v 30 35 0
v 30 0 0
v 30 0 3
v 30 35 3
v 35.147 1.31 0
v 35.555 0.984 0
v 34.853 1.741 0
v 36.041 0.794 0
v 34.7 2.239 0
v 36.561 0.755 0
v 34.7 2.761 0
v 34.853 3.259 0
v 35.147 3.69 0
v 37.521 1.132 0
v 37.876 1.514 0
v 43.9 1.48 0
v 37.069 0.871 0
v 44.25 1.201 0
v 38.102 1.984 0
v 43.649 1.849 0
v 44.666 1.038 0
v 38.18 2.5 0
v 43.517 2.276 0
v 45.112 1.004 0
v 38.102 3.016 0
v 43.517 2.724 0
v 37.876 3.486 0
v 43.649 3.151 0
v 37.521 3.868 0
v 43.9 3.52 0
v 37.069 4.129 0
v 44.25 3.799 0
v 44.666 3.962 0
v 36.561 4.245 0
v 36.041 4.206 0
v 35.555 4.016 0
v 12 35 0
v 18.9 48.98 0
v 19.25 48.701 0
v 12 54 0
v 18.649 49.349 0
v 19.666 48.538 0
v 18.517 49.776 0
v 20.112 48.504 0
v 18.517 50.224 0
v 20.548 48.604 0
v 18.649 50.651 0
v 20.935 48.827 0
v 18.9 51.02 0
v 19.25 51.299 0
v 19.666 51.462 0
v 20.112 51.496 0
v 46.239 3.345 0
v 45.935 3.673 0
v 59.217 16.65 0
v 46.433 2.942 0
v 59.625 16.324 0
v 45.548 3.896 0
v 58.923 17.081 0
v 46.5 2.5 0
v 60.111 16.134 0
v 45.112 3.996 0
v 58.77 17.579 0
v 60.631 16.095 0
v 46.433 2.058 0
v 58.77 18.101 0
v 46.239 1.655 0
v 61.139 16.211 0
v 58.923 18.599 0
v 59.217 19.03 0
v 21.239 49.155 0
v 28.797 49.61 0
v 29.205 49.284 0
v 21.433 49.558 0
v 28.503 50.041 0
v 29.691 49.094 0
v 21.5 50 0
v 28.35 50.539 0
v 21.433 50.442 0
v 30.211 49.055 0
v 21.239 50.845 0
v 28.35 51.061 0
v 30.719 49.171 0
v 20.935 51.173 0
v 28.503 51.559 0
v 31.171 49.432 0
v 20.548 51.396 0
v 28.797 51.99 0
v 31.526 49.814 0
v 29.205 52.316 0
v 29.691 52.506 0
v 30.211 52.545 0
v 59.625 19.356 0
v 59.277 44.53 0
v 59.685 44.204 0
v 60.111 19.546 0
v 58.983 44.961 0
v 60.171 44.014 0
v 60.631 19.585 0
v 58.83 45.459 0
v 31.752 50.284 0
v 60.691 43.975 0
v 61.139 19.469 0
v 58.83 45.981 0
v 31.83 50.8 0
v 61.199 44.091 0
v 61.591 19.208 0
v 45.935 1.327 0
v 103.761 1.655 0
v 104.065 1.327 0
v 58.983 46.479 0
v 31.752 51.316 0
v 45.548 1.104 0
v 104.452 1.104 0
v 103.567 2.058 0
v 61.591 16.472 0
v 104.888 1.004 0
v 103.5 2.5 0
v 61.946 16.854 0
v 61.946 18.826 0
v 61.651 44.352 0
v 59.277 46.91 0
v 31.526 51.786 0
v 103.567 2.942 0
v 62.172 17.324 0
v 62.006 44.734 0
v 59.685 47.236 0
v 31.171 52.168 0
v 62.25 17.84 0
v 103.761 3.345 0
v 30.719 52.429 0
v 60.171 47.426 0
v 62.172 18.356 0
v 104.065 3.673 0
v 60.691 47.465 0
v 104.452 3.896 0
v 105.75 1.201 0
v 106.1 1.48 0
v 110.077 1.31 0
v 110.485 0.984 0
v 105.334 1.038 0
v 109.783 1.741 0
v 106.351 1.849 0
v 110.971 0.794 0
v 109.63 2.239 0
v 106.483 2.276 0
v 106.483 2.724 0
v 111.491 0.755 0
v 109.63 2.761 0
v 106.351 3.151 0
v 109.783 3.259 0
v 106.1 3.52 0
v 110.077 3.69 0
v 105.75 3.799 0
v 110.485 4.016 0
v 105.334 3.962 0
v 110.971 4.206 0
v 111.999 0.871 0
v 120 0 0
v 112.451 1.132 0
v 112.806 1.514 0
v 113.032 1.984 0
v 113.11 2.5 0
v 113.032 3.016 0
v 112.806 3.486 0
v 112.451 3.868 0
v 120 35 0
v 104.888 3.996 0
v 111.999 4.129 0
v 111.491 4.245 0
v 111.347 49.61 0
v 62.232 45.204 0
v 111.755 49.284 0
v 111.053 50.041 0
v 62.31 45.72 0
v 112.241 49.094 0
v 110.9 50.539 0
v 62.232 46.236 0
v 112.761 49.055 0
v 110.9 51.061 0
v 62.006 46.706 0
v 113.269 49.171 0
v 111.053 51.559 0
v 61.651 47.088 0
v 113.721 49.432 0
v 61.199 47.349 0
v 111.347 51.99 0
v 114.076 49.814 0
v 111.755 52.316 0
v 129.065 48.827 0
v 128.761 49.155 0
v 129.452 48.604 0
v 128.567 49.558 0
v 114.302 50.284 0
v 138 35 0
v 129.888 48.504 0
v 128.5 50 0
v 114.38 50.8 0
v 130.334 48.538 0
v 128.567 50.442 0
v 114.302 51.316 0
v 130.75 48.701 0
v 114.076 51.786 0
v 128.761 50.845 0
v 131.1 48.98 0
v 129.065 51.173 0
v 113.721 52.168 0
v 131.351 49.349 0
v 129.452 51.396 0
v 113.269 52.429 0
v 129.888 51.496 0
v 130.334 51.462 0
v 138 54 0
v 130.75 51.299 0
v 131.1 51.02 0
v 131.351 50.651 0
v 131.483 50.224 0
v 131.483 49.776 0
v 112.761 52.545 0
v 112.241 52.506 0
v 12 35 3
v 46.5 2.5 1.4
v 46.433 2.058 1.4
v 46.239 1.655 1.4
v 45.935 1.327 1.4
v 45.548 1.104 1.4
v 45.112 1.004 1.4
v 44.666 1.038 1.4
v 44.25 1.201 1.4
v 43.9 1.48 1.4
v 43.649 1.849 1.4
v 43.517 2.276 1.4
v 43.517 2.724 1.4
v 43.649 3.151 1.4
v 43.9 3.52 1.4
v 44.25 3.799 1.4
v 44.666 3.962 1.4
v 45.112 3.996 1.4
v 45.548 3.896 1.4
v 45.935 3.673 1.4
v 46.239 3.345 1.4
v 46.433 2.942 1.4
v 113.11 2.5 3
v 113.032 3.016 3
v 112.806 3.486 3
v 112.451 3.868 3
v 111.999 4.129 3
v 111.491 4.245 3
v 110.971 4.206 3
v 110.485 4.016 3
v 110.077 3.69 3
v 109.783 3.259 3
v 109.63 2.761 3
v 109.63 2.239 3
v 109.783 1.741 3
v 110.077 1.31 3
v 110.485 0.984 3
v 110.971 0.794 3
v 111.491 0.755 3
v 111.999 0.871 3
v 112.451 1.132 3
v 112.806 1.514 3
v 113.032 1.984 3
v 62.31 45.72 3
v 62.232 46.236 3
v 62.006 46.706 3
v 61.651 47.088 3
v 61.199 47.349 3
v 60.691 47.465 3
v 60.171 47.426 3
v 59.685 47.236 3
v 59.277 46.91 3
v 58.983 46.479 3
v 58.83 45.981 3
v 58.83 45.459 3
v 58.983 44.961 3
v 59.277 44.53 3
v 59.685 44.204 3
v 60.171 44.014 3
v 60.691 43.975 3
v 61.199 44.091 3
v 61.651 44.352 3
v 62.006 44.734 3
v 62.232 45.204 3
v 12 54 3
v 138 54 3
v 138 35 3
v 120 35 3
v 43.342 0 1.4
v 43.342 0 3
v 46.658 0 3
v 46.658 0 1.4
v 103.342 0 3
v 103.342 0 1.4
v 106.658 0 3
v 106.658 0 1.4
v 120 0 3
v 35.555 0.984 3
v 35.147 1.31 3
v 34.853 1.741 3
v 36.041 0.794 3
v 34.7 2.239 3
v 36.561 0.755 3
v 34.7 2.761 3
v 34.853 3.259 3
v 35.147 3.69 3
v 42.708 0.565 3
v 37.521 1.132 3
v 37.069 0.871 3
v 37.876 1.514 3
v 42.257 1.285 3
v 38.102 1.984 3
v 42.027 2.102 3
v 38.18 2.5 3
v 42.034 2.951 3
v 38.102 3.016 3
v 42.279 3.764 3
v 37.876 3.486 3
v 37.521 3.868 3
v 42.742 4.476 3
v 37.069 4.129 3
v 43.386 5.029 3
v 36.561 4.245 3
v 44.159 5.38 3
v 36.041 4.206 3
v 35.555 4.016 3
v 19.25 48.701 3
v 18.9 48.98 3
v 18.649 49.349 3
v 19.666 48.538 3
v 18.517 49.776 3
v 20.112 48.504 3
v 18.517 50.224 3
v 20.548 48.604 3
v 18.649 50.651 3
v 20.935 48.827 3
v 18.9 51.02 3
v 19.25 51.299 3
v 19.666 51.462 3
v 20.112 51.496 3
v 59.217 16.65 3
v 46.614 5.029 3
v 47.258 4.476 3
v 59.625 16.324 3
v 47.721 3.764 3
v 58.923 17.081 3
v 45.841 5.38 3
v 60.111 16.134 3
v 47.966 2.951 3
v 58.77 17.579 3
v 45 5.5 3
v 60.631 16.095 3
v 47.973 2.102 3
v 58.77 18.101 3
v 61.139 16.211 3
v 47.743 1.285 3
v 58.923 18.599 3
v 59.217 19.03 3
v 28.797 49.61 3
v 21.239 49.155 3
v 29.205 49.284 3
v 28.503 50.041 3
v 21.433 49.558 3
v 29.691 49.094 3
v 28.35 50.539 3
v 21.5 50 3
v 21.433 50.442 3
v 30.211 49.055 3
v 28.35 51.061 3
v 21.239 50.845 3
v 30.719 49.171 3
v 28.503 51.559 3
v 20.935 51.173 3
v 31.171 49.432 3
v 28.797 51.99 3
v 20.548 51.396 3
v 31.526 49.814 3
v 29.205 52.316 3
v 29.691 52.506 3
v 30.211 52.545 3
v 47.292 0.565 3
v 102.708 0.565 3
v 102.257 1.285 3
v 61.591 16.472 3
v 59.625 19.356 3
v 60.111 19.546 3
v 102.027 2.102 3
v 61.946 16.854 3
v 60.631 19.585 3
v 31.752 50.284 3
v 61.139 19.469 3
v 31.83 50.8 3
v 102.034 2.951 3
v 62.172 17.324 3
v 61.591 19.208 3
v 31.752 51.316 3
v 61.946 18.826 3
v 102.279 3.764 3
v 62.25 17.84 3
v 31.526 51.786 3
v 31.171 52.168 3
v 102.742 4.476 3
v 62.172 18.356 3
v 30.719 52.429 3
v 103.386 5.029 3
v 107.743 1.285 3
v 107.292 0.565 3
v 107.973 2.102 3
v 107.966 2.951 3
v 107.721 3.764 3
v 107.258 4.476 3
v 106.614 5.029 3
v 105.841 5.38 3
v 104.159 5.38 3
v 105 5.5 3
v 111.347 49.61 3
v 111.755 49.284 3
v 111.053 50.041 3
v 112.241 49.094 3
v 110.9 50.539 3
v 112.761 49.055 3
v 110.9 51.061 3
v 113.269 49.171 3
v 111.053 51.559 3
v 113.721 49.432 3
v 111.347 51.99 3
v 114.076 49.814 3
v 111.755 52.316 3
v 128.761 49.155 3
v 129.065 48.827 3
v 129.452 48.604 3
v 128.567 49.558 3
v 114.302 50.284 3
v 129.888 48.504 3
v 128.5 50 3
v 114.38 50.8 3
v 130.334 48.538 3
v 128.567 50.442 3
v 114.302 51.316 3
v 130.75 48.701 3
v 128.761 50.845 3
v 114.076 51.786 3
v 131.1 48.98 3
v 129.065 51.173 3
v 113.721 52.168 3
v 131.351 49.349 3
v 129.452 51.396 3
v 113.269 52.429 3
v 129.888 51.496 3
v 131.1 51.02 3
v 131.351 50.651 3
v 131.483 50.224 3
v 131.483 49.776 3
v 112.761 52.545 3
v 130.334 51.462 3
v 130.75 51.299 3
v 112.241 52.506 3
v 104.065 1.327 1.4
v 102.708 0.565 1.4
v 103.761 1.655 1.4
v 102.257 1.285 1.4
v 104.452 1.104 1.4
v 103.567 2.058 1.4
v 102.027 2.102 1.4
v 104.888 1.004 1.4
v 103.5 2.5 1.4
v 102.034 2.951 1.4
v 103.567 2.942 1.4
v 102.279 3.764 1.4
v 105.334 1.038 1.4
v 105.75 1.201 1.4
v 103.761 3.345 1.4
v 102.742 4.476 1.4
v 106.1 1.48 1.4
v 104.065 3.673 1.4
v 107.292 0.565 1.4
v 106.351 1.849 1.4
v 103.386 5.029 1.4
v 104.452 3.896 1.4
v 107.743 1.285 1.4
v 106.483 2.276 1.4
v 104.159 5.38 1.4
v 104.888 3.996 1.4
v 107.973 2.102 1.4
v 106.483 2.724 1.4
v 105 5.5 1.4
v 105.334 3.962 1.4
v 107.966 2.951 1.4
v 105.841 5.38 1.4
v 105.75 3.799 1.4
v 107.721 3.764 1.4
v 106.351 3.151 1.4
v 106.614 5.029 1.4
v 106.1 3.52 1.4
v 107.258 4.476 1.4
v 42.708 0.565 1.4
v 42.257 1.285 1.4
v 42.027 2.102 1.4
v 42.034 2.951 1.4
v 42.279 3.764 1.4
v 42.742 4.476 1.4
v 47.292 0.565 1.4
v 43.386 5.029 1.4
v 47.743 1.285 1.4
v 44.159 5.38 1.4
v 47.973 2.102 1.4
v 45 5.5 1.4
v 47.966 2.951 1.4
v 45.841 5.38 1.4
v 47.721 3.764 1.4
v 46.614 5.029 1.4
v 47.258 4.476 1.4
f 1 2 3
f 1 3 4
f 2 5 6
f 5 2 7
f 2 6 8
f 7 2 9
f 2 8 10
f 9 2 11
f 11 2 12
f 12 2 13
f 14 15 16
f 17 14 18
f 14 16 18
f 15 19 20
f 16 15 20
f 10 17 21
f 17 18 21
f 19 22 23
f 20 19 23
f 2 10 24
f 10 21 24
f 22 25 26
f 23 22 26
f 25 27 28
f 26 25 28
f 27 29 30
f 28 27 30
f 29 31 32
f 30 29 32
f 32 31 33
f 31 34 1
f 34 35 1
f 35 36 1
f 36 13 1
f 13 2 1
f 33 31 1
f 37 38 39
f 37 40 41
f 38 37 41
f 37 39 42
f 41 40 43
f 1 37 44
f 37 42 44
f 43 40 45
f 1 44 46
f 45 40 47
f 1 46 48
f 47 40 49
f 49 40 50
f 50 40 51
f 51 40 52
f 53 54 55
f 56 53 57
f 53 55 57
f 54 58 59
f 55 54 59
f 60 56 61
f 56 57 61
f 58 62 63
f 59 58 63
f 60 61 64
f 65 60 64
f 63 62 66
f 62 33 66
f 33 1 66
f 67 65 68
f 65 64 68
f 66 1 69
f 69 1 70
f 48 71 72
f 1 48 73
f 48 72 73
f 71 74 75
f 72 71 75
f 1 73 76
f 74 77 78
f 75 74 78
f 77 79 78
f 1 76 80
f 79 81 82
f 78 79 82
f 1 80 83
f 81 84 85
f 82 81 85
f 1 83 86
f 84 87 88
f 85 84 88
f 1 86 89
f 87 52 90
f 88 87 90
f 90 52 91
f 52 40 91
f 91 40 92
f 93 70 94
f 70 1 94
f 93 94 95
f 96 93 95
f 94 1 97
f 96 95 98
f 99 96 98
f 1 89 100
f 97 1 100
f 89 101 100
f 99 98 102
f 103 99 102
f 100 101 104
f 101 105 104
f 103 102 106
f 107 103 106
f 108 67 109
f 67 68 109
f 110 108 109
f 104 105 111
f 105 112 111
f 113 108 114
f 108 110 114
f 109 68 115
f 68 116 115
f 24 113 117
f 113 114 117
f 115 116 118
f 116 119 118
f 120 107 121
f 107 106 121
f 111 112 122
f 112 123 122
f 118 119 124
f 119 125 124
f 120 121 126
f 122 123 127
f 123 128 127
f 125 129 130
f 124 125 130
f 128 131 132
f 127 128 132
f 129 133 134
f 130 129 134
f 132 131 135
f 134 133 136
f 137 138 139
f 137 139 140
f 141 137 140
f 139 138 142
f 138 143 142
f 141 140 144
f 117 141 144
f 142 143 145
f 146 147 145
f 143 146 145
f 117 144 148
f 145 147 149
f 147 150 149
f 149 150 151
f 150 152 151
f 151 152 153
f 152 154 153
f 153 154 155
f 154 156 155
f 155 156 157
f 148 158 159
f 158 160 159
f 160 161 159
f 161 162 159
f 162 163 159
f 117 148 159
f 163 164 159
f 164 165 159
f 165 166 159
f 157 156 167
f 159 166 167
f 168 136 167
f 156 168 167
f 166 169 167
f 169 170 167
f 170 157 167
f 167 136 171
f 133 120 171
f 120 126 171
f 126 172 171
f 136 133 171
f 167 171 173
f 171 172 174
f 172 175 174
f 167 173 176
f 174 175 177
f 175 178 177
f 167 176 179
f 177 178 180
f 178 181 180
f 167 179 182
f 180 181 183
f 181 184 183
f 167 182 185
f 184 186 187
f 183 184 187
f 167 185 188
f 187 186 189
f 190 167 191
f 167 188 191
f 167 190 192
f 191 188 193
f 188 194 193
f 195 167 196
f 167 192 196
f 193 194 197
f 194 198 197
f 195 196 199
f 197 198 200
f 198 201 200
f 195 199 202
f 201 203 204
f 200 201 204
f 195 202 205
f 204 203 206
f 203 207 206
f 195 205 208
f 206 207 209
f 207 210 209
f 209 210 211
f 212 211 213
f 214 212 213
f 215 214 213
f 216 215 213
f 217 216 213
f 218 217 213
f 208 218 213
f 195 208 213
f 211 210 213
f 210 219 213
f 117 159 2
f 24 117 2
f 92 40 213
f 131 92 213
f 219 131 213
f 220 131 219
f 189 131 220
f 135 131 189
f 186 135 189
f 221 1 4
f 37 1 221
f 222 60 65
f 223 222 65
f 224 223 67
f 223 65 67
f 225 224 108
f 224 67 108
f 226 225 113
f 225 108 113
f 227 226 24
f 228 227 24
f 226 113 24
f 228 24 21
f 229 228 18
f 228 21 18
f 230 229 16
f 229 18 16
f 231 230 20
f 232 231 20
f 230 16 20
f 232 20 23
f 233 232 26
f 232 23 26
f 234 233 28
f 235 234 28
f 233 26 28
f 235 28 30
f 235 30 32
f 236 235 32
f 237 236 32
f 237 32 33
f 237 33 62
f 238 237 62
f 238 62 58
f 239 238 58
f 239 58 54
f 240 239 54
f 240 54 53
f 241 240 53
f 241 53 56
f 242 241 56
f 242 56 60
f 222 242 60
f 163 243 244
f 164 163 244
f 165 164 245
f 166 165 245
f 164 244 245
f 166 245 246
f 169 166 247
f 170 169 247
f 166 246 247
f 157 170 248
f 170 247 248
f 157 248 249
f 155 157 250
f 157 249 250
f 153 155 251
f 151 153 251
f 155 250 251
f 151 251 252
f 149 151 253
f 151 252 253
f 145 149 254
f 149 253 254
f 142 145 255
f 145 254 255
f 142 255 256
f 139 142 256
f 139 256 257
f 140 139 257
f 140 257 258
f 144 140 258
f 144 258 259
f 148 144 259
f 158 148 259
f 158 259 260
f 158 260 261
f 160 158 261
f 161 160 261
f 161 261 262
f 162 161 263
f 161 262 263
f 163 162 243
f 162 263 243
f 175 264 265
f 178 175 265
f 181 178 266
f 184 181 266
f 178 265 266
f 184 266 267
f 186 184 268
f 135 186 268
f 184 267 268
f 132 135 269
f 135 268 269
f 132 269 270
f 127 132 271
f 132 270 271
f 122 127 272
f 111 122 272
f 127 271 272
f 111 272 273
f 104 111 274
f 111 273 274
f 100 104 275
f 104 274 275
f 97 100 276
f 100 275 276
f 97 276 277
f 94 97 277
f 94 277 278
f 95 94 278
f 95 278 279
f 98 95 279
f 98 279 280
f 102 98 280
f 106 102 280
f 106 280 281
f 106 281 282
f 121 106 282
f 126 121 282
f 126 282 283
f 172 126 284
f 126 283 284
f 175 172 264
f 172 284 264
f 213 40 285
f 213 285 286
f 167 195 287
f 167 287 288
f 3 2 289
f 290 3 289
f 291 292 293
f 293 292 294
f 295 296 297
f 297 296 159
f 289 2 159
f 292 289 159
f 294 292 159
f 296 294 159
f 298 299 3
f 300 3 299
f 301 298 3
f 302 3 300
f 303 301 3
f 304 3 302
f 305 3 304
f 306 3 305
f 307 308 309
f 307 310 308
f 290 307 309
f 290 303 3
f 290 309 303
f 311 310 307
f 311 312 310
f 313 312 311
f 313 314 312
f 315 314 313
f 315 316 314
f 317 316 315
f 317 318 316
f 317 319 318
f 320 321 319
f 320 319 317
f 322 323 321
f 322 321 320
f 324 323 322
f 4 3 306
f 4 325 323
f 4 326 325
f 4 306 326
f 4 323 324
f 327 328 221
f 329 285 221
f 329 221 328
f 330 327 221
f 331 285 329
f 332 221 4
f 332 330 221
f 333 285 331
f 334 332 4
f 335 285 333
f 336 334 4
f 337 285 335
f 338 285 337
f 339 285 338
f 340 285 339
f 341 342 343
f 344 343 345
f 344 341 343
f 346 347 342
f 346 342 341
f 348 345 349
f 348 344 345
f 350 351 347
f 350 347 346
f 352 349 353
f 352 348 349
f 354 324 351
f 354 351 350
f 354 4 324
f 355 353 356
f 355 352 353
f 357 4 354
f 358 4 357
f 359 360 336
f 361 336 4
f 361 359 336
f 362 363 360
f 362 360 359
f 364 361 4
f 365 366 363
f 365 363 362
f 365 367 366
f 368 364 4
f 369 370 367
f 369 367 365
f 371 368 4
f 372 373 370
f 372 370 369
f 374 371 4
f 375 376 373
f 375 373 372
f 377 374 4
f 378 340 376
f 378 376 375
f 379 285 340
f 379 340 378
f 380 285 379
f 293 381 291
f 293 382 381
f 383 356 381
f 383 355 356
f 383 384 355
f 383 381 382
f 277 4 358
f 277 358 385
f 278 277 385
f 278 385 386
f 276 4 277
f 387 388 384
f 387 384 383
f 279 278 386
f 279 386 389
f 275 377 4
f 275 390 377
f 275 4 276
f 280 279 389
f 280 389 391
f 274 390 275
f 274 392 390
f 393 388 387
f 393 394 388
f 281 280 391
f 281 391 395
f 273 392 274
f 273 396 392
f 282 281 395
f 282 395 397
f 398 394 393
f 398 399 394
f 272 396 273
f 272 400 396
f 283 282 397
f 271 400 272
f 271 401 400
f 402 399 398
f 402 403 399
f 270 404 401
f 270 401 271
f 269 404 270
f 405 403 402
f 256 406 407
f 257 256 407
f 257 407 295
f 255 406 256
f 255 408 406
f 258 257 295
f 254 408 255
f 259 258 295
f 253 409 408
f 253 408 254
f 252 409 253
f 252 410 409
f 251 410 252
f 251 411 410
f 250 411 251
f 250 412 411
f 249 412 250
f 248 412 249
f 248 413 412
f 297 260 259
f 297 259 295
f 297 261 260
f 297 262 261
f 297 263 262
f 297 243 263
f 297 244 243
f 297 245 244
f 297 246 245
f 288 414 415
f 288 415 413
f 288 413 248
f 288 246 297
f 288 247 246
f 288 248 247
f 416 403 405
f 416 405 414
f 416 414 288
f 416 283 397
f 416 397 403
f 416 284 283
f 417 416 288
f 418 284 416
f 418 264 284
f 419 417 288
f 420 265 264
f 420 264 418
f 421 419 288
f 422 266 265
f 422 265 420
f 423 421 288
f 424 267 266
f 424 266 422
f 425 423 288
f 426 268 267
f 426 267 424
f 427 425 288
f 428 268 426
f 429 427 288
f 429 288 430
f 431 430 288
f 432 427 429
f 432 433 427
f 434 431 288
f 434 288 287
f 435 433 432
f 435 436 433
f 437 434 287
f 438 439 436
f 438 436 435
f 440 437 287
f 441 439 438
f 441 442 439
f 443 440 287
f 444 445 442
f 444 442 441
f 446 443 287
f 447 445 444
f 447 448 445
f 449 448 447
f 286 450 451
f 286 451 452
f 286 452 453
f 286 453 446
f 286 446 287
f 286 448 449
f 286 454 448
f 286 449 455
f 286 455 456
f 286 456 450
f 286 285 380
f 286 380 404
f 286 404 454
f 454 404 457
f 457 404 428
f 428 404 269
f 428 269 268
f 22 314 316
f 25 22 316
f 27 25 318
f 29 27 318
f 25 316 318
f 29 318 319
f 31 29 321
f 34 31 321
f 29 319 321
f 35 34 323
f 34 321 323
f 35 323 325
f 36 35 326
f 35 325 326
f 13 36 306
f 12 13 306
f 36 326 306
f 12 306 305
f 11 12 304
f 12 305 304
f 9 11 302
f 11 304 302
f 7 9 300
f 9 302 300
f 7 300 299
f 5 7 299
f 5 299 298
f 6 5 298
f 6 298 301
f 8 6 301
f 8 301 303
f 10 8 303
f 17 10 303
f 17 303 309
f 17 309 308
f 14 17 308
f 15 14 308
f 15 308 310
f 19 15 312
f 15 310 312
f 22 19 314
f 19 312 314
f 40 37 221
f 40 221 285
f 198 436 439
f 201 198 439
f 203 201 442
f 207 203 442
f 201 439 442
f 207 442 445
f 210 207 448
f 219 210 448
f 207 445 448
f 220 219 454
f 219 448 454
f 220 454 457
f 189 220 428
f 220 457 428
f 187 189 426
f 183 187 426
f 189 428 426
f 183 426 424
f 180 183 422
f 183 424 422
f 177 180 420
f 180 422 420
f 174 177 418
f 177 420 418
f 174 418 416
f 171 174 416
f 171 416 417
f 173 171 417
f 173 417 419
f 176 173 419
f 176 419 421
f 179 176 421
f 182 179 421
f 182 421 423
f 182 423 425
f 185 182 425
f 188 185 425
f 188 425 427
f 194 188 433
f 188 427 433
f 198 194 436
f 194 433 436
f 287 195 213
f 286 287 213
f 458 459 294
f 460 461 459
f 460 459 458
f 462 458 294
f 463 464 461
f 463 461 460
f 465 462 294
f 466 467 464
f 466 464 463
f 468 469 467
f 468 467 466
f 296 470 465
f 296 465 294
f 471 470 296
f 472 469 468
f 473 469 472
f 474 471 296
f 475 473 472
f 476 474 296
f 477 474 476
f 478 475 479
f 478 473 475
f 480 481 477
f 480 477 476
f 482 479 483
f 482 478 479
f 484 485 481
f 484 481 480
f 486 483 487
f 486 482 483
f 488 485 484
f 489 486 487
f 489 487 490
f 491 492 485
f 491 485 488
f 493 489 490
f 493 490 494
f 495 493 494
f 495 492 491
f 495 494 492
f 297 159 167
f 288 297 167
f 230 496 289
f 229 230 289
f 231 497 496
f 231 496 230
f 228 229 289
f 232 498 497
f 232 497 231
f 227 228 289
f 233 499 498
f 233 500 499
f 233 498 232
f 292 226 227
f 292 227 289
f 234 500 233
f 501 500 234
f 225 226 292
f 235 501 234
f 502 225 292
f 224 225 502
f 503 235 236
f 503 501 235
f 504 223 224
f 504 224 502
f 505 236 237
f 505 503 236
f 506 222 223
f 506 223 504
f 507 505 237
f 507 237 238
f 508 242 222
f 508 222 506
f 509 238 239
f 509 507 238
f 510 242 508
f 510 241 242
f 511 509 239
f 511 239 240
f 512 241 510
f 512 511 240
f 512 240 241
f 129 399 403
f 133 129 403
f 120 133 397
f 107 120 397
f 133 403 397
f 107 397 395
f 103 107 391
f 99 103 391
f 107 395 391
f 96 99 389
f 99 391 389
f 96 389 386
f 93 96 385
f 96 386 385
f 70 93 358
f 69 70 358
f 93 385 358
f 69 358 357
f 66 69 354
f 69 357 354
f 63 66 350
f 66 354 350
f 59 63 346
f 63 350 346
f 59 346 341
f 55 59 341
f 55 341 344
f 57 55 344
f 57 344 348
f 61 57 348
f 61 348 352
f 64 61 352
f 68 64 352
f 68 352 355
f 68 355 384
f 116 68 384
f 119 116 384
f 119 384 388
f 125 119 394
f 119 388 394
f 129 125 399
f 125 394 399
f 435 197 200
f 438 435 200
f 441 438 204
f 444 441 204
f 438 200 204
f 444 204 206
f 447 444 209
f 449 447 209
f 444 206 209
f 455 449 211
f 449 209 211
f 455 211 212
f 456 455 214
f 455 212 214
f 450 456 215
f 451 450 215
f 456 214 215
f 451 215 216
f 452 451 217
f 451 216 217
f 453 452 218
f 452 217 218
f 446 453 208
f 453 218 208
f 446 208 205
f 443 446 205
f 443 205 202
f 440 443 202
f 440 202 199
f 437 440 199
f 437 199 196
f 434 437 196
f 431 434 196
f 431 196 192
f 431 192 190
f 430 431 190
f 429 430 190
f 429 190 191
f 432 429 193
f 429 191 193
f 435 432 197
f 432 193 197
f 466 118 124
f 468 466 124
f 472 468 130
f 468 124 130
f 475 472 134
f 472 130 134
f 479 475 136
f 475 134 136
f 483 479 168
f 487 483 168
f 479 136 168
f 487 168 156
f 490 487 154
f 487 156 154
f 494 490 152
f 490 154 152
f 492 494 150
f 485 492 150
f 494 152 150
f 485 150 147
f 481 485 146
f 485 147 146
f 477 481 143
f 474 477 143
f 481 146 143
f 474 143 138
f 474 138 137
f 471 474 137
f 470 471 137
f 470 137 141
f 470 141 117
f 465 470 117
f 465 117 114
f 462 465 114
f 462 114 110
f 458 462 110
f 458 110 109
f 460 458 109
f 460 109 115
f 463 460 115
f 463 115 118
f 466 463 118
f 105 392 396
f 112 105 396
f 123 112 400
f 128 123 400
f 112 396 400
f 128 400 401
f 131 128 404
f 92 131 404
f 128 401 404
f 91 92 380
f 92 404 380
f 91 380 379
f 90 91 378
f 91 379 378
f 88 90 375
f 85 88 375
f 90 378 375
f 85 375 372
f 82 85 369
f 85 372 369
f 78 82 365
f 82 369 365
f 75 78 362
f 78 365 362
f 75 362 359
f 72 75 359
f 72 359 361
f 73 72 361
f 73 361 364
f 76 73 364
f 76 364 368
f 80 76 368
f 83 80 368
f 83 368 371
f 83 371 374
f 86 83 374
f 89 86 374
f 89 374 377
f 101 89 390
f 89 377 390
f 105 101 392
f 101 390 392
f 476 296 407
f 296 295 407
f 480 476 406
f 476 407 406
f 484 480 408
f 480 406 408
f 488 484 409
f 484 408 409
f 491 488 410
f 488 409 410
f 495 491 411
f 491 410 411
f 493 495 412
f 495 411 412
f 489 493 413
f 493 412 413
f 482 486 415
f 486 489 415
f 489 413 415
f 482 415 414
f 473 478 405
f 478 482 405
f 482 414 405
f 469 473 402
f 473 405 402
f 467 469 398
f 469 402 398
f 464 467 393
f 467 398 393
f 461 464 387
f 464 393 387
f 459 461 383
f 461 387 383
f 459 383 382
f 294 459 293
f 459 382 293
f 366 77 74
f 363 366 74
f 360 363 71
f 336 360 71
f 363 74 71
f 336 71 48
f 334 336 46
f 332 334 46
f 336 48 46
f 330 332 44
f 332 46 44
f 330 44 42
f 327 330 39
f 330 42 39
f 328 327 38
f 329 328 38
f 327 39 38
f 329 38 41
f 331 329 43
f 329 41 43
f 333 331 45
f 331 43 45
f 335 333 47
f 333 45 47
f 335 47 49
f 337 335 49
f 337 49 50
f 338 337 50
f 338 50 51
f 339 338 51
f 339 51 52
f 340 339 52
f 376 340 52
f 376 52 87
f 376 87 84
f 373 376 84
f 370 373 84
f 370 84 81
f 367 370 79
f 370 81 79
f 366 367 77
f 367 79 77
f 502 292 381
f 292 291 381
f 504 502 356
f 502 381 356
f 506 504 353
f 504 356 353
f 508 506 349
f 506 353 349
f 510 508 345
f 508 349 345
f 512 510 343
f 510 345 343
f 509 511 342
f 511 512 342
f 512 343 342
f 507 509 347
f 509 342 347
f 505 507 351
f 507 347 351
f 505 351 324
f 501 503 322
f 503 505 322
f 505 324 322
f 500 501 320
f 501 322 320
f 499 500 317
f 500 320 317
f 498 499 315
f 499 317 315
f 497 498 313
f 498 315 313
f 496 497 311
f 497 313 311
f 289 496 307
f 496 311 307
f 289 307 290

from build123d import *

# Parameters (mm, degrees)
SKETCH1_W           = 150
SKETCH1_H           = 54
BOSS_EXTRUDE1_DEPTH = 3
SKETCH2_W           = 30
SKETCH2_H           = 35
CUT_EXTRUDE1_DEPTH  = 160.452187191
SKETCH4_W           = 12
SKETCH4_H           = 19
CUT_EXTRUDE2_DEPTH  = 3
SKETCH5_R           = 1.5
CUT_EXTRUDE3_DEPTH  = 3
SKETCH7_R           = 3
CUT_EXTRUDE5_DEPTH  = 1.6
SKETCH8_R           = 1.75
CUT_EXTRUDE6_DEPTH  = 3


with BuildPart() as part:
    # Sketch1 → Boss-Extrude1 (new body)
    with BuildSketch(Plane.XY):
        with Locations((75, 27)):
            Rectangle(SKETCH1_W, SKETCH1_H)
    extrude(amount=BOSS_EXTRUDE1_DEPTH)

    # Sketch2 → Cut-Extrude1 (cut, through all)
    with BuildSketch(Plane(origin=(0, 0, 0), x_dir=(-1, 0, 0), z_dir=(0, 0, -1))):
        with Locations((-15, 17.5)):
            Rectangle(SKETCH2_W, SKETCH2_H)
        with Locations((-135, 17.5)):
            Rectangle(SKETCH2_W, SKETCH2_H)
    extrude(amount=-CUT_EXTRUDE1_DEPTH, mode=Mode.SUBTRACT)

    # Sketch4 → Cut-Extrude2 (cut)
    with BuildSketch(Plane(origin=(0, 0, 0), x_dir=(-1, 0, 0), z_dir=(0, 0, -1))):
        with Locations((-144, 44.5)):
            Rectangle(SKETCH4_W, SKETCH4_H)
        with Locations((-6, 44.5)):
            Rectangle(SKETCH4_W, SKETCH4_H)
    extrude(amount=-CUT_EXTRUDE2_DEPTH, mode=Mode.SUBTRACT)

    # Sketch5 → Cut-Extrude3 (cut)
    with BuildSketch(Plane(origin=(0, 0, 0), x_dir=(-1, 0, 0), z_dir=(0, 0, -1))):
        with Locations((-130, 50)):
            Circle(SKETCH5_R)
        with Locations((-105, 2.5)):
            Circle(SKETCH5_R)
        with Locations(Location((-45, 2.5, 0), (0, 0, 180))):
            Circle(SKETCH5_R)
        with Locations(Location((-20, 50, 0), (0, 0, 180))):
            Circle(SKETCH5_R)
    extrude(amount=-CUT_EXTRUDE3_DEPTH, mode=Mode.SUBTRACT)

    # Sketch7 → Cut-Extrude5 (cut)
    with BuildSketch(Plane.XY.offset(3)):
        with Locations((45, 2.5)):
            Circle(SKETCH7_R)
        with Locations((105, 2.5)):
            Circle(SKETCH7_R)
    extrude(amount=-CUT_EXTRUDE5_DEPTH, mode=Mode.SUBTRACT)

    # Sketch8 → Cut-Extrude6 (cut)
    with BuildSketch(Plane.XY.offset(3)):
        with Locations((30.08, 50.8)):
            Circle(SKETCH8_R)
        with Locations((60.56, 45.72)):
            Circle(SKETCH8_R)
        with Locations((60.5, 17.84)):
            Circle(SKETCH8_R)
        with Locations((36.43, 2.5)):
            Circle(SKETCH8_R)
        with Locations((111.36, 2.5)):
            Circle(SKETCH8_R)
        with Locations((112.63, 50.8)):
            Circle(SKETCH8_R)
    extrude(amount=-CUT_EXTRUDE6_DEPTH, mode=Mode.SUBTRACT)


solid = part.part
